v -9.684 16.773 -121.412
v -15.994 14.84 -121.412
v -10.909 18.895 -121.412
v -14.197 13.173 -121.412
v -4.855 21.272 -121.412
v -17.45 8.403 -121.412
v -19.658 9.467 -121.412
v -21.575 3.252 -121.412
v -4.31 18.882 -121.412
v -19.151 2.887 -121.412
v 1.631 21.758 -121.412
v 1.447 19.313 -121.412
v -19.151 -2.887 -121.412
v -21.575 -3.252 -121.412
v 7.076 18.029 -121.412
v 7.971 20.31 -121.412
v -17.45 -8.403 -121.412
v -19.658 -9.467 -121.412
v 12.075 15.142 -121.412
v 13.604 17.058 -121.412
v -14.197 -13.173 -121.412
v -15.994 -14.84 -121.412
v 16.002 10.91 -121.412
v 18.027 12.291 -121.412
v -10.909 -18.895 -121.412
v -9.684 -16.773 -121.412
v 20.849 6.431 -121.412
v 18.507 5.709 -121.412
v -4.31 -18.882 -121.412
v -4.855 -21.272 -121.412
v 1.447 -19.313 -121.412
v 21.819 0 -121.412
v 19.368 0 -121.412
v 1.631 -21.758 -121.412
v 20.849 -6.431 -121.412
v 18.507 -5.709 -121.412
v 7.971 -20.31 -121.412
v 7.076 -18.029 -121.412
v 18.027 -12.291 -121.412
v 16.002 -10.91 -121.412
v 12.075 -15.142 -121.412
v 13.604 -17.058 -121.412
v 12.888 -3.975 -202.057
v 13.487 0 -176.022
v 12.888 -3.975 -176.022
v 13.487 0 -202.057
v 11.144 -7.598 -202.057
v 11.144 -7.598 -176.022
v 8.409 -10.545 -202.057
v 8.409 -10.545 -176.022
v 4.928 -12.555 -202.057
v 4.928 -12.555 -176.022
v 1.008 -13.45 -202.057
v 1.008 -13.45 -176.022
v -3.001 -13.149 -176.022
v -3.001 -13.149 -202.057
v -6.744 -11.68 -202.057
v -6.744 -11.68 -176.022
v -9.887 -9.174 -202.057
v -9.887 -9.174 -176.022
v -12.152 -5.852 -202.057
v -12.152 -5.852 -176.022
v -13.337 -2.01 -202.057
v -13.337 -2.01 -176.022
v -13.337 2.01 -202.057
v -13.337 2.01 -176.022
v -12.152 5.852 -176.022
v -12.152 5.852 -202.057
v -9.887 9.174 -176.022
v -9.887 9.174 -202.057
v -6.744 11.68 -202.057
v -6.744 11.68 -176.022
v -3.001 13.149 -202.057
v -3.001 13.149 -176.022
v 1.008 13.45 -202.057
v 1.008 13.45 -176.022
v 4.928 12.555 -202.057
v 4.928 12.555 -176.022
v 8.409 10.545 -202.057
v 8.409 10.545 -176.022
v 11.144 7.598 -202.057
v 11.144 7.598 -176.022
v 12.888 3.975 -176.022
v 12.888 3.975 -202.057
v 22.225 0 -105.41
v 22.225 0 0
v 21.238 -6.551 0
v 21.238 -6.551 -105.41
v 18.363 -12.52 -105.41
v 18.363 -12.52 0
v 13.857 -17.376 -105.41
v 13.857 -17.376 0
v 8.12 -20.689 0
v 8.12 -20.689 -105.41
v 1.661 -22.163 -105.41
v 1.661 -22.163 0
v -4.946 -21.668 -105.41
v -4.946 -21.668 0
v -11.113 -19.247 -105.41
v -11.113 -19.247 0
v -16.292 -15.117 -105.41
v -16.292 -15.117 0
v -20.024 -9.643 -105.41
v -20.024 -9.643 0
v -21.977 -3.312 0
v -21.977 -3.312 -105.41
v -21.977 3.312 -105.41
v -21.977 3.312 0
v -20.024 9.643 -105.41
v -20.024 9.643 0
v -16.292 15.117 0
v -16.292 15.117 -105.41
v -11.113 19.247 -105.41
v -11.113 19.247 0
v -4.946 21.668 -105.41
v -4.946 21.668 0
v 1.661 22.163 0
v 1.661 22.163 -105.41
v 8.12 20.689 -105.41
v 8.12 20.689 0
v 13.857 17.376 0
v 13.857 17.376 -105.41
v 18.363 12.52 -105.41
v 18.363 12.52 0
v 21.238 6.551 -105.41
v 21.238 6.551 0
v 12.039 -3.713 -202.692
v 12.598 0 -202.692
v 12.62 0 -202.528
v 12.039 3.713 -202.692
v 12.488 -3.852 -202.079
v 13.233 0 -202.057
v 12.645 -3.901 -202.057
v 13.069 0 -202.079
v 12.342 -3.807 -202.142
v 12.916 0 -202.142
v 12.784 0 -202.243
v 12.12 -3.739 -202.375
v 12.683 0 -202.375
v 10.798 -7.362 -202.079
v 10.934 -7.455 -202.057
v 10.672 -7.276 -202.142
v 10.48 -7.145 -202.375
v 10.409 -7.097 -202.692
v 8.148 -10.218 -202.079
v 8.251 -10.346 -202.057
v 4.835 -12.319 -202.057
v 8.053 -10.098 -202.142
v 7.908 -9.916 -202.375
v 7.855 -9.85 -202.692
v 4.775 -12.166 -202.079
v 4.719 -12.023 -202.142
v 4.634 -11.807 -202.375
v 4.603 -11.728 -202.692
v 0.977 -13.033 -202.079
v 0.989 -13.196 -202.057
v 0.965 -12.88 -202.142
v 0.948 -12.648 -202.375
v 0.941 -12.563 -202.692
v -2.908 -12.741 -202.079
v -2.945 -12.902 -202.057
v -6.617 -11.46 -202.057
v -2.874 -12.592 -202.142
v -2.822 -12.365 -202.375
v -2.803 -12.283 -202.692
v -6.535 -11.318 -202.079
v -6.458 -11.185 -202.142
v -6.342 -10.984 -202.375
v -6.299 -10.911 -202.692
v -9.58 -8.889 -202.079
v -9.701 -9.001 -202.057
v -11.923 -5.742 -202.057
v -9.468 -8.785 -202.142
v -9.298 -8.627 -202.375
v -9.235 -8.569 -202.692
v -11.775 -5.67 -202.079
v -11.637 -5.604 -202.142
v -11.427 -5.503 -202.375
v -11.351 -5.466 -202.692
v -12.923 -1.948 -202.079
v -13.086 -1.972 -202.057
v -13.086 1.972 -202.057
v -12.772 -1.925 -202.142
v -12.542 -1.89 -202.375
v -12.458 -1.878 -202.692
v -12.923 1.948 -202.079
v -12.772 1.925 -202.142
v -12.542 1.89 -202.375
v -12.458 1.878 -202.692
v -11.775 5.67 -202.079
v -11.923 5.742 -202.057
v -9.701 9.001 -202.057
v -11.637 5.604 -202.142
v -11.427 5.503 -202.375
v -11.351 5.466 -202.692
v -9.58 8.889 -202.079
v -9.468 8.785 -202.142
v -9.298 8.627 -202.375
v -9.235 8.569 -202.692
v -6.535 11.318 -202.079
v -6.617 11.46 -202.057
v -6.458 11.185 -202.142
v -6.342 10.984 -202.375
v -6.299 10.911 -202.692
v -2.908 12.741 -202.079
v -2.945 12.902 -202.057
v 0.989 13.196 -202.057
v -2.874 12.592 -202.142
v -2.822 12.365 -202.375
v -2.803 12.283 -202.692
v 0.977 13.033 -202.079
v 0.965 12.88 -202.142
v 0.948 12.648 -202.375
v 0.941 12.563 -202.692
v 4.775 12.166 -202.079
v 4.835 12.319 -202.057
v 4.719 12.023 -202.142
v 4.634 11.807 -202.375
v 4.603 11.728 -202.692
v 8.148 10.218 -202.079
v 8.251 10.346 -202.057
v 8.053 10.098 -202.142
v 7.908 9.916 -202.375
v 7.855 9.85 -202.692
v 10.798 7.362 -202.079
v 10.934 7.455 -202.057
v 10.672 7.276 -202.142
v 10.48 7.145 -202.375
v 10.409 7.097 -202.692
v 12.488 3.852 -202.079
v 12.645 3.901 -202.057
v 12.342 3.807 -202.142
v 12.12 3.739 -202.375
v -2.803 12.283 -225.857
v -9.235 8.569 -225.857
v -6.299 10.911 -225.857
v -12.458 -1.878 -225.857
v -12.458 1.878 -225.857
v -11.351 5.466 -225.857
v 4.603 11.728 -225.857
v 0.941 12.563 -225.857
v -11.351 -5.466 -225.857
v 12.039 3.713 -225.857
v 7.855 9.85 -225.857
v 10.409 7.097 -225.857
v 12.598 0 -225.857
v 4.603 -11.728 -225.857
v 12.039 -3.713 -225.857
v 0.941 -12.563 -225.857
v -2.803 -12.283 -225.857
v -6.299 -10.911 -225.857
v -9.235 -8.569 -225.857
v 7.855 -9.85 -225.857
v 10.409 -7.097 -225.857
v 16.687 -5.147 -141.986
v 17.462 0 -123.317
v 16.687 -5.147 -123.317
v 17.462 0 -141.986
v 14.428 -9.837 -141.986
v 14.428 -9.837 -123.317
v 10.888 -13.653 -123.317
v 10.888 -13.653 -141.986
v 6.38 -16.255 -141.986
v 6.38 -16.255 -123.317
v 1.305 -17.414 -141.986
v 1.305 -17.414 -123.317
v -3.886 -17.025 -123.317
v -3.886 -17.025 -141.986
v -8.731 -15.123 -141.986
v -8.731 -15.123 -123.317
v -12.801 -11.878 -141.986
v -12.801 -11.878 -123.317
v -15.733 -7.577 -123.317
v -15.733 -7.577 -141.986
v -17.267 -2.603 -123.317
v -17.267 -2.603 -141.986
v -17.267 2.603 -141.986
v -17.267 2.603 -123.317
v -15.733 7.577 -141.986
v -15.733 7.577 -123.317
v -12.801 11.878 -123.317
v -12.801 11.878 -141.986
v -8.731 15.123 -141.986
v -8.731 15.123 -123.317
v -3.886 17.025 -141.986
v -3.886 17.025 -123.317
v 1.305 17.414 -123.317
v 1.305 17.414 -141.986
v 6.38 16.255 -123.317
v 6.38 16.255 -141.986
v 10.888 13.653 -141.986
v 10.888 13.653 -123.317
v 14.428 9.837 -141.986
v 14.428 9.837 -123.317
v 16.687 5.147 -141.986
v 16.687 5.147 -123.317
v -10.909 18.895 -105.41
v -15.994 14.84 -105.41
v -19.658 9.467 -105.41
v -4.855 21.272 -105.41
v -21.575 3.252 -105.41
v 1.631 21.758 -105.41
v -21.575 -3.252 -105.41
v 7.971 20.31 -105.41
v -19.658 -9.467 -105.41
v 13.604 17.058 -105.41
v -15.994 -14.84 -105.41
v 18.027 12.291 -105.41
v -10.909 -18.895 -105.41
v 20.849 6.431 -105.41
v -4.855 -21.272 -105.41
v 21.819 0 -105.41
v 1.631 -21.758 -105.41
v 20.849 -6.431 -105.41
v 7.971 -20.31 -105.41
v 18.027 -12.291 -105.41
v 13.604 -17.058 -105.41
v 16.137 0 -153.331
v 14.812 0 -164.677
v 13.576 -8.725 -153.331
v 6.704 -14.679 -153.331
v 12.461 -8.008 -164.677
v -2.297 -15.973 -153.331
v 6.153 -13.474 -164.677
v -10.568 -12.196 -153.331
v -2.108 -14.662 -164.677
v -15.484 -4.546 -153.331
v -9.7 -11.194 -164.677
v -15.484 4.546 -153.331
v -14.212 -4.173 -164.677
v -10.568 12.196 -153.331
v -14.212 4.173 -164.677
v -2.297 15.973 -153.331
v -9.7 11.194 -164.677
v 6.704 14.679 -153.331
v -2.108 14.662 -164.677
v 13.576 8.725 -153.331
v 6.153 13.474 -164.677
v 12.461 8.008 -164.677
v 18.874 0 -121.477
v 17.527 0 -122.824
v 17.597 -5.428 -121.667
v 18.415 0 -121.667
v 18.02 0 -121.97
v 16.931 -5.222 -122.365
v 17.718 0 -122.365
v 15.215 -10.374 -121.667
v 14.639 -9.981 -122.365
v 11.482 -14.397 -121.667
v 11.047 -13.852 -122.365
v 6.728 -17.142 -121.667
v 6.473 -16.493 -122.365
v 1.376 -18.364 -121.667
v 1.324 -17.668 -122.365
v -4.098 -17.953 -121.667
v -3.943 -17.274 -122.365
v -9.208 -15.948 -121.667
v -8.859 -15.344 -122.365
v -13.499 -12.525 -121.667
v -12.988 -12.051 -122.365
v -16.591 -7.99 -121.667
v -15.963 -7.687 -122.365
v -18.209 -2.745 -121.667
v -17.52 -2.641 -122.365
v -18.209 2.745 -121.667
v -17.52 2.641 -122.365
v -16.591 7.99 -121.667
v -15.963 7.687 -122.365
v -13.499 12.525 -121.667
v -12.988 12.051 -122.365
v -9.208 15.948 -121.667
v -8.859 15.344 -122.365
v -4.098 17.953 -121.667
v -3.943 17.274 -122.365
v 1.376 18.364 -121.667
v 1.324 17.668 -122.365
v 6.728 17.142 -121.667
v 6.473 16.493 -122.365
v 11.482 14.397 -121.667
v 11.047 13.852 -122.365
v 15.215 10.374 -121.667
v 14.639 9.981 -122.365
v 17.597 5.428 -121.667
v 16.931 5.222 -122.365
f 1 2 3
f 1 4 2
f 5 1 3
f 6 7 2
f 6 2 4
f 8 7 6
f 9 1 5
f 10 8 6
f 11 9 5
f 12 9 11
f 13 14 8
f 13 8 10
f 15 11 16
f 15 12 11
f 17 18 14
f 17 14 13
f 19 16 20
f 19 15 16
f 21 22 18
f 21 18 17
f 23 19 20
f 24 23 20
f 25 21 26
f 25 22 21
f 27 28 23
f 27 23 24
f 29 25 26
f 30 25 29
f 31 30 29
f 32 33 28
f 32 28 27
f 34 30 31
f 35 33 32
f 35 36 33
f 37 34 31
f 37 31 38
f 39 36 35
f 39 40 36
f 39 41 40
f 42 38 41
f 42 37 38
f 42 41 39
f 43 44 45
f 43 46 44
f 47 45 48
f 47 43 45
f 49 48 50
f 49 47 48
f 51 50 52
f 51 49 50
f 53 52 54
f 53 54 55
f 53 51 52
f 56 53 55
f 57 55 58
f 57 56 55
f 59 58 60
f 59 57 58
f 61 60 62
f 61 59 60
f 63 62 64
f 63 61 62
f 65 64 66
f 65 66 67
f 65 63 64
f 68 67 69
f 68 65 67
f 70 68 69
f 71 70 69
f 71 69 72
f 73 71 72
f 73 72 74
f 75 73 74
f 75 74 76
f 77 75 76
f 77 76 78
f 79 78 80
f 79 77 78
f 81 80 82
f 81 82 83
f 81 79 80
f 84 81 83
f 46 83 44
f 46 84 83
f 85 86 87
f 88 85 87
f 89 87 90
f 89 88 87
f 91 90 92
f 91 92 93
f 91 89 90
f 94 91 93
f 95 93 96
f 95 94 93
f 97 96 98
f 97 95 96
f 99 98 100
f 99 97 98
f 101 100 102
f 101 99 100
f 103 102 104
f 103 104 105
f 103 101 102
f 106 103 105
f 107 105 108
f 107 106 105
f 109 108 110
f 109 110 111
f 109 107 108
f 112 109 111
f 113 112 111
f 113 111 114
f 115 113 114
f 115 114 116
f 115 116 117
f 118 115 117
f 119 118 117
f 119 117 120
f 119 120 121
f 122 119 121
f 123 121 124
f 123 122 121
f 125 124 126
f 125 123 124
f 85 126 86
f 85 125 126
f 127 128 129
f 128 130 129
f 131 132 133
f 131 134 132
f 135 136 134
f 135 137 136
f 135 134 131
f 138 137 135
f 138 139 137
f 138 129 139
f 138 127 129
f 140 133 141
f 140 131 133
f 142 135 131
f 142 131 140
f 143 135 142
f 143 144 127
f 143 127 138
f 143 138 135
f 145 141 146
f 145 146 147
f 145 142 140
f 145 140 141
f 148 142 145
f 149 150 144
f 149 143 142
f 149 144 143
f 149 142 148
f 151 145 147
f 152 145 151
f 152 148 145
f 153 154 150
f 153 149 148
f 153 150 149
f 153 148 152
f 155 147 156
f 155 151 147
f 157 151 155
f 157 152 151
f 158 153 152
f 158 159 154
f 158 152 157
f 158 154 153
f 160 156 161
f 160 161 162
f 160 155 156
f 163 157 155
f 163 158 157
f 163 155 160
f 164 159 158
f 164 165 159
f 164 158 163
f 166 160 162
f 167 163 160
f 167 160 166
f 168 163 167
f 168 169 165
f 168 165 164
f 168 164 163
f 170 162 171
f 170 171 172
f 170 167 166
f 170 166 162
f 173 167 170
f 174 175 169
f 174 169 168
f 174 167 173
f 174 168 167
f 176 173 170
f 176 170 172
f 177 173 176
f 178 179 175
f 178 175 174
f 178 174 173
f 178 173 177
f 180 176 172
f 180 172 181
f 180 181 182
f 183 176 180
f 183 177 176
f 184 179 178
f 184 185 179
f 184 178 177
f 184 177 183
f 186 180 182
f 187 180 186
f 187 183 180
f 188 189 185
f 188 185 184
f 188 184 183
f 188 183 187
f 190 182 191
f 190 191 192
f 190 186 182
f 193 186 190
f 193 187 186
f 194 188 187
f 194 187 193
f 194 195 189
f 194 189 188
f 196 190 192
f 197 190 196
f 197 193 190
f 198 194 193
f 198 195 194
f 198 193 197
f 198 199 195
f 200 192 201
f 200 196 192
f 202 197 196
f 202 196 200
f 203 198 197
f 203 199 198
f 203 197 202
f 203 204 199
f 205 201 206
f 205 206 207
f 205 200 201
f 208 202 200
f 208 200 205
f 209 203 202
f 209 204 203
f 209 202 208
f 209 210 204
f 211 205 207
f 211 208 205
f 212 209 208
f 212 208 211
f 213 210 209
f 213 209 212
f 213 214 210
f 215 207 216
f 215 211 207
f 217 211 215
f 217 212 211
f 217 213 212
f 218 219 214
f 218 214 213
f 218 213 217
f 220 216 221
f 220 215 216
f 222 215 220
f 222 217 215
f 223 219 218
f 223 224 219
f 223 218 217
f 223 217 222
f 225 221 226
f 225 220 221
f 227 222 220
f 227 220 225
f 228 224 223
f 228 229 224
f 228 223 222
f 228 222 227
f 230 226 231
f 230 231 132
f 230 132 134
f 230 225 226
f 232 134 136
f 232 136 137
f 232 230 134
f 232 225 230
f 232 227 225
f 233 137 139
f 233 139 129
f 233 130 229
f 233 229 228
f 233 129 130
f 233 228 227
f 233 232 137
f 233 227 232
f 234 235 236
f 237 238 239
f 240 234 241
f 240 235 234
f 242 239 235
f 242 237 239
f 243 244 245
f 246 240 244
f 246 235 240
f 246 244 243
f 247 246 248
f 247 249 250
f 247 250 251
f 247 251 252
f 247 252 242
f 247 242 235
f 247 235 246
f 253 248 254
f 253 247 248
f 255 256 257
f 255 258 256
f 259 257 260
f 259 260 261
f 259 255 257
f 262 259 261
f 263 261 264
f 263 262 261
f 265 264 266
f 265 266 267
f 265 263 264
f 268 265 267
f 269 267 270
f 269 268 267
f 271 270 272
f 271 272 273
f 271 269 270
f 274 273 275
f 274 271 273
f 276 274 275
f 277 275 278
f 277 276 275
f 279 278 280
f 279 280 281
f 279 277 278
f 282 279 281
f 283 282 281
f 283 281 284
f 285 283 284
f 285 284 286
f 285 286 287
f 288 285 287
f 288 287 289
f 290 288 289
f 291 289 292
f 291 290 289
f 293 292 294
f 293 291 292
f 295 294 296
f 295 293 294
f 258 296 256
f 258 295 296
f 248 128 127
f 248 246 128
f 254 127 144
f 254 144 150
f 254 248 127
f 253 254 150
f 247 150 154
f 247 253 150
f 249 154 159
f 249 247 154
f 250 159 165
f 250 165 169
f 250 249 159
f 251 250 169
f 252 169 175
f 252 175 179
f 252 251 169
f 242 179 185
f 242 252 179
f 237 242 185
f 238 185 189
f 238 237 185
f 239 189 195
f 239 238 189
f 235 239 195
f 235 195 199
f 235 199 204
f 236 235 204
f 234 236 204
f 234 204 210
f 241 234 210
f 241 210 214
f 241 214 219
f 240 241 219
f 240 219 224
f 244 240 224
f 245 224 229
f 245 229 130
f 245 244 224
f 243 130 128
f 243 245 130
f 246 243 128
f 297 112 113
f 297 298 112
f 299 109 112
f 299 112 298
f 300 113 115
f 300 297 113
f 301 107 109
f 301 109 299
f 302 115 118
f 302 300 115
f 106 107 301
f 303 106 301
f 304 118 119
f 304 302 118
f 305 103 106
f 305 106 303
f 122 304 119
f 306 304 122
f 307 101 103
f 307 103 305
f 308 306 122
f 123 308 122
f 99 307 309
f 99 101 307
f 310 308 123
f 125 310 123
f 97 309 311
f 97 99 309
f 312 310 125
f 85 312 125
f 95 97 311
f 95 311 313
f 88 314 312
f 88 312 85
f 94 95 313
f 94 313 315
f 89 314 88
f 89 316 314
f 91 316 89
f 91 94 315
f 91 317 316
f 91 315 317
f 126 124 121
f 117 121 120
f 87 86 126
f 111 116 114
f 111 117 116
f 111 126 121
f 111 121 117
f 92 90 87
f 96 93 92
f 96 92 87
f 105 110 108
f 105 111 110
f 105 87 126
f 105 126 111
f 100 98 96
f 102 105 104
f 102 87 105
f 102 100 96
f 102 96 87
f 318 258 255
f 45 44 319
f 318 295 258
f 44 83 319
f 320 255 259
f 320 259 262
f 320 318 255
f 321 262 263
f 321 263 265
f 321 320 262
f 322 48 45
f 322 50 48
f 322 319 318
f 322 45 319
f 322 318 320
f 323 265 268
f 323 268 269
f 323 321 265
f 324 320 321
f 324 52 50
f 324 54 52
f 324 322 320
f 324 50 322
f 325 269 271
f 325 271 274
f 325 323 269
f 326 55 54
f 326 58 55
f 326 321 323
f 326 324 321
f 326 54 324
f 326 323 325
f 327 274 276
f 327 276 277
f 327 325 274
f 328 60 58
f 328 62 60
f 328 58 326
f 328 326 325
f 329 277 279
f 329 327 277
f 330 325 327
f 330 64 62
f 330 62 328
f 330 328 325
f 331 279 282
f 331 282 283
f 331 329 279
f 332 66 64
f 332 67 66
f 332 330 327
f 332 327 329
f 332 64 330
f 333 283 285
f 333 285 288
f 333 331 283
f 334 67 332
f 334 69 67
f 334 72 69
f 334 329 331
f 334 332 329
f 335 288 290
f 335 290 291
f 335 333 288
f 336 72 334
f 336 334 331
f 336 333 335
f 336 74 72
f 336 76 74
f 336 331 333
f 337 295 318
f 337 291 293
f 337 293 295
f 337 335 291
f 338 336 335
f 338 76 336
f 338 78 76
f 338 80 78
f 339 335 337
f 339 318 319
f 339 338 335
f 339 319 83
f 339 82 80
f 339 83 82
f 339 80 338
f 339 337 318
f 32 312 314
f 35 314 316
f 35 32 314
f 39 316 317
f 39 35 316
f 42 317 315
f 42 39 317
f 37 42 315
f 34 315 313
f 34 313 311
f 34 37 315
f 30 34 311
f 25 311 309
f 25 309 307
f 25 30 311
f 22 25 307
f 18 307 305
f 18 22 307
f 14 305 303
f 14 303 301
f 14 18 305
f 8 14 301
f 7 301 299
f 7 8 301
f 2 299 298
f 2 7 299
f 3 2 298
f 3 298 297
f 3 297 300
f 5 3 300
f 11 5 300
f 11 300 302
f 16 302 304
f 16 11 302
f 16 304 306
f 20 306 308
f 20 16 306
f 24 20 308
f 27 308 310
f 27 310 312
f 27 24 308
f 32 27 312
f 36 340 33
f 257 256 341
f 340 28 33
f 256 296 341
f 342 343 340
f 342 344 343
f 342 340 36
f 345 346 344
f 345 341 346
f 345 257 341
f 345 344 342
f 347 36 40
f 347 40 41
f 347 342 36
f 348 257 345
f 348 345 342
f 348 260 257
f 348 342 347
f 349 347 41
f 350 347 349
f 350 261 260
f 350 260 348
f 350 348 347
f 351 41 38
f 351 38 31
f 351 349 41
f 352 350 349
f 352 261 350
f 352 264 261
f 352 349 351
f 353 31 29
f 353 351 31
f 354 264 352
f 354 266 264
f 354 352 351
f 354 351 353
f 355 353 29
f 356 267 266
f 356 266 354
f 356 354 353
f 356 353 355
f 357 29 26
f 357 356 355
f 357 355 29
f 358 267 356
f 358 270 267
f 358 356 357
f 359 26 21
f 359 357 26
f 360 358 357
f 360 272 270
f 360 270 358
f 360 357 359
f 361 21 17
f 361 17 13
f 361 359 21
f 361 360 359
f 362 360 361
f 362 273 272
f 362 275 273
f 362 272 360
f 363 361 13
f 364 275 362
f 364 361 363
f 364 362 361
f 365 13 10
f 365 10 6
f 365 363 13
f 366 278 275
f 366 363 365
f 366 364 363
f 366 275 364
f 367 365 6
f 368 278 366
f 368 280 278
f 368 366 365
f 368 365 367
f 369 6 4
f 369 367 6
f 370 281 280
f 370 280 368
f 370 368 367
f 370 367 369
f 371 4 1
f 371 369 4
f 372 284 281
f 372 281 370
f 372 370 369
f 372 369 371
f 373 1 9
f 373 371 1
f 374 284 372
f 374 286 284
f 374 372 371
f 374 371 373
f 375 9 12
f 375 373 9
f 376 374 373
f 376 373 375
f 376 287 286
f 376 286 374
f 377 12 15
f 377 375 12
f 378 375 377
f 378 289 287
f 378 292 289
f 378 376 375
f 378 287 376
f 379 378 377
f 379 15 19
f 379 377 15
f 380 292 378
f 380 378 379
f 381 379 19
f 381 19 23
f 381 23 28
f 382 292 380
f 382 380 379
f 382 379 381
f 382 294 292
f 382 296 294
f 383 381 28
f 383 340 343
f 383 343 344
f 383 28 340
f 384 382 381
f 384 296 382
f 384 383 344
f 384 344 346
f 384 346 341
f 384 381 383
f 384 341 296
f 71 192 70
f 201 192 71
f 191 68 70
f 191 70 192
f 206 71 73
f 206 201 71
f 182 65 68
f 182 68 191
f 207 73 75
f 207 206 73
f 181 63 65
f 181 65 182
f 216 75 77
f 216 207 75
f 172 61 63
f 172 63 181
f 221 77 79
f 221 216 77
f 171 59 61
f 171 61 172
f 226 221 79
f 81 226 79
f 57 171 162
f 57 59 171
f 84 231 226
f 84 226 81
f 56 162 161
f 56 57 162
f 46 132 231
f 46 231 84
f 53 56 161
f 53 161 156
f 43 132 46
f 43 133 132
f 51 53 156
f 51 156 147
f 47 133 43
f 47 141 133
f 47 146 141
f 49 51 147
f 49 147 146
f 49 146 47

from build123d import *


with BuildPart() as part:
    # Sketch1 → Revolve1 (revolve)
    with BuildSketch(Plane(origin=(0, 0, 0), x_dir=(0, 0, -1), z_dir=(1, 0, 0)), mode=Mode.PRIVATE) as revolve1_sk:
        with BuildLine():
            Line((0, 0), (0, 22.225))
            Line((0, 22.225), (105.41, 22.225))
            Line((105.41, 22.225), (105.41, 21.8186))
            Line((105.41, 21.8186), (121.412, 21.8186))
            Line((121.412, 21.8186), (121.412, 19.3675))
            ThreePointArc((121.412, 19.3675), (121.969961582, 18.020461582), (123.317, 17.4625))
            Line((123.317, 17.4625), (141.986, 17.4625))
            Line((141.986, 17.4625), (176.022, 13.4874))
            Line((176.022, 13.4874), (202.057, 13.4874))
            Line((202.057, 13.4874), (202.057, 13.2334))
            ThreePointArc((202.057, 13.2334), (202.242987194, 12.784387194), (202.692, 12.5984))
            Line((202.692, 12.5984), (204.597, 12.5984))
            Line((204.597, 12.5984), (225.8568, 12.5984))
            Line((225.8568, 12.5984), (225.8568, 0))
            Line((225.8568, 0), (0, 0))
        make_face()
    revolve(revolve1_sk.sketch.rotate(Axis((0, 0, 0), (0, 0, -1)), 90), axis=Axis((0, 0, 0), (0, 0, -1)))


solid = part.part
